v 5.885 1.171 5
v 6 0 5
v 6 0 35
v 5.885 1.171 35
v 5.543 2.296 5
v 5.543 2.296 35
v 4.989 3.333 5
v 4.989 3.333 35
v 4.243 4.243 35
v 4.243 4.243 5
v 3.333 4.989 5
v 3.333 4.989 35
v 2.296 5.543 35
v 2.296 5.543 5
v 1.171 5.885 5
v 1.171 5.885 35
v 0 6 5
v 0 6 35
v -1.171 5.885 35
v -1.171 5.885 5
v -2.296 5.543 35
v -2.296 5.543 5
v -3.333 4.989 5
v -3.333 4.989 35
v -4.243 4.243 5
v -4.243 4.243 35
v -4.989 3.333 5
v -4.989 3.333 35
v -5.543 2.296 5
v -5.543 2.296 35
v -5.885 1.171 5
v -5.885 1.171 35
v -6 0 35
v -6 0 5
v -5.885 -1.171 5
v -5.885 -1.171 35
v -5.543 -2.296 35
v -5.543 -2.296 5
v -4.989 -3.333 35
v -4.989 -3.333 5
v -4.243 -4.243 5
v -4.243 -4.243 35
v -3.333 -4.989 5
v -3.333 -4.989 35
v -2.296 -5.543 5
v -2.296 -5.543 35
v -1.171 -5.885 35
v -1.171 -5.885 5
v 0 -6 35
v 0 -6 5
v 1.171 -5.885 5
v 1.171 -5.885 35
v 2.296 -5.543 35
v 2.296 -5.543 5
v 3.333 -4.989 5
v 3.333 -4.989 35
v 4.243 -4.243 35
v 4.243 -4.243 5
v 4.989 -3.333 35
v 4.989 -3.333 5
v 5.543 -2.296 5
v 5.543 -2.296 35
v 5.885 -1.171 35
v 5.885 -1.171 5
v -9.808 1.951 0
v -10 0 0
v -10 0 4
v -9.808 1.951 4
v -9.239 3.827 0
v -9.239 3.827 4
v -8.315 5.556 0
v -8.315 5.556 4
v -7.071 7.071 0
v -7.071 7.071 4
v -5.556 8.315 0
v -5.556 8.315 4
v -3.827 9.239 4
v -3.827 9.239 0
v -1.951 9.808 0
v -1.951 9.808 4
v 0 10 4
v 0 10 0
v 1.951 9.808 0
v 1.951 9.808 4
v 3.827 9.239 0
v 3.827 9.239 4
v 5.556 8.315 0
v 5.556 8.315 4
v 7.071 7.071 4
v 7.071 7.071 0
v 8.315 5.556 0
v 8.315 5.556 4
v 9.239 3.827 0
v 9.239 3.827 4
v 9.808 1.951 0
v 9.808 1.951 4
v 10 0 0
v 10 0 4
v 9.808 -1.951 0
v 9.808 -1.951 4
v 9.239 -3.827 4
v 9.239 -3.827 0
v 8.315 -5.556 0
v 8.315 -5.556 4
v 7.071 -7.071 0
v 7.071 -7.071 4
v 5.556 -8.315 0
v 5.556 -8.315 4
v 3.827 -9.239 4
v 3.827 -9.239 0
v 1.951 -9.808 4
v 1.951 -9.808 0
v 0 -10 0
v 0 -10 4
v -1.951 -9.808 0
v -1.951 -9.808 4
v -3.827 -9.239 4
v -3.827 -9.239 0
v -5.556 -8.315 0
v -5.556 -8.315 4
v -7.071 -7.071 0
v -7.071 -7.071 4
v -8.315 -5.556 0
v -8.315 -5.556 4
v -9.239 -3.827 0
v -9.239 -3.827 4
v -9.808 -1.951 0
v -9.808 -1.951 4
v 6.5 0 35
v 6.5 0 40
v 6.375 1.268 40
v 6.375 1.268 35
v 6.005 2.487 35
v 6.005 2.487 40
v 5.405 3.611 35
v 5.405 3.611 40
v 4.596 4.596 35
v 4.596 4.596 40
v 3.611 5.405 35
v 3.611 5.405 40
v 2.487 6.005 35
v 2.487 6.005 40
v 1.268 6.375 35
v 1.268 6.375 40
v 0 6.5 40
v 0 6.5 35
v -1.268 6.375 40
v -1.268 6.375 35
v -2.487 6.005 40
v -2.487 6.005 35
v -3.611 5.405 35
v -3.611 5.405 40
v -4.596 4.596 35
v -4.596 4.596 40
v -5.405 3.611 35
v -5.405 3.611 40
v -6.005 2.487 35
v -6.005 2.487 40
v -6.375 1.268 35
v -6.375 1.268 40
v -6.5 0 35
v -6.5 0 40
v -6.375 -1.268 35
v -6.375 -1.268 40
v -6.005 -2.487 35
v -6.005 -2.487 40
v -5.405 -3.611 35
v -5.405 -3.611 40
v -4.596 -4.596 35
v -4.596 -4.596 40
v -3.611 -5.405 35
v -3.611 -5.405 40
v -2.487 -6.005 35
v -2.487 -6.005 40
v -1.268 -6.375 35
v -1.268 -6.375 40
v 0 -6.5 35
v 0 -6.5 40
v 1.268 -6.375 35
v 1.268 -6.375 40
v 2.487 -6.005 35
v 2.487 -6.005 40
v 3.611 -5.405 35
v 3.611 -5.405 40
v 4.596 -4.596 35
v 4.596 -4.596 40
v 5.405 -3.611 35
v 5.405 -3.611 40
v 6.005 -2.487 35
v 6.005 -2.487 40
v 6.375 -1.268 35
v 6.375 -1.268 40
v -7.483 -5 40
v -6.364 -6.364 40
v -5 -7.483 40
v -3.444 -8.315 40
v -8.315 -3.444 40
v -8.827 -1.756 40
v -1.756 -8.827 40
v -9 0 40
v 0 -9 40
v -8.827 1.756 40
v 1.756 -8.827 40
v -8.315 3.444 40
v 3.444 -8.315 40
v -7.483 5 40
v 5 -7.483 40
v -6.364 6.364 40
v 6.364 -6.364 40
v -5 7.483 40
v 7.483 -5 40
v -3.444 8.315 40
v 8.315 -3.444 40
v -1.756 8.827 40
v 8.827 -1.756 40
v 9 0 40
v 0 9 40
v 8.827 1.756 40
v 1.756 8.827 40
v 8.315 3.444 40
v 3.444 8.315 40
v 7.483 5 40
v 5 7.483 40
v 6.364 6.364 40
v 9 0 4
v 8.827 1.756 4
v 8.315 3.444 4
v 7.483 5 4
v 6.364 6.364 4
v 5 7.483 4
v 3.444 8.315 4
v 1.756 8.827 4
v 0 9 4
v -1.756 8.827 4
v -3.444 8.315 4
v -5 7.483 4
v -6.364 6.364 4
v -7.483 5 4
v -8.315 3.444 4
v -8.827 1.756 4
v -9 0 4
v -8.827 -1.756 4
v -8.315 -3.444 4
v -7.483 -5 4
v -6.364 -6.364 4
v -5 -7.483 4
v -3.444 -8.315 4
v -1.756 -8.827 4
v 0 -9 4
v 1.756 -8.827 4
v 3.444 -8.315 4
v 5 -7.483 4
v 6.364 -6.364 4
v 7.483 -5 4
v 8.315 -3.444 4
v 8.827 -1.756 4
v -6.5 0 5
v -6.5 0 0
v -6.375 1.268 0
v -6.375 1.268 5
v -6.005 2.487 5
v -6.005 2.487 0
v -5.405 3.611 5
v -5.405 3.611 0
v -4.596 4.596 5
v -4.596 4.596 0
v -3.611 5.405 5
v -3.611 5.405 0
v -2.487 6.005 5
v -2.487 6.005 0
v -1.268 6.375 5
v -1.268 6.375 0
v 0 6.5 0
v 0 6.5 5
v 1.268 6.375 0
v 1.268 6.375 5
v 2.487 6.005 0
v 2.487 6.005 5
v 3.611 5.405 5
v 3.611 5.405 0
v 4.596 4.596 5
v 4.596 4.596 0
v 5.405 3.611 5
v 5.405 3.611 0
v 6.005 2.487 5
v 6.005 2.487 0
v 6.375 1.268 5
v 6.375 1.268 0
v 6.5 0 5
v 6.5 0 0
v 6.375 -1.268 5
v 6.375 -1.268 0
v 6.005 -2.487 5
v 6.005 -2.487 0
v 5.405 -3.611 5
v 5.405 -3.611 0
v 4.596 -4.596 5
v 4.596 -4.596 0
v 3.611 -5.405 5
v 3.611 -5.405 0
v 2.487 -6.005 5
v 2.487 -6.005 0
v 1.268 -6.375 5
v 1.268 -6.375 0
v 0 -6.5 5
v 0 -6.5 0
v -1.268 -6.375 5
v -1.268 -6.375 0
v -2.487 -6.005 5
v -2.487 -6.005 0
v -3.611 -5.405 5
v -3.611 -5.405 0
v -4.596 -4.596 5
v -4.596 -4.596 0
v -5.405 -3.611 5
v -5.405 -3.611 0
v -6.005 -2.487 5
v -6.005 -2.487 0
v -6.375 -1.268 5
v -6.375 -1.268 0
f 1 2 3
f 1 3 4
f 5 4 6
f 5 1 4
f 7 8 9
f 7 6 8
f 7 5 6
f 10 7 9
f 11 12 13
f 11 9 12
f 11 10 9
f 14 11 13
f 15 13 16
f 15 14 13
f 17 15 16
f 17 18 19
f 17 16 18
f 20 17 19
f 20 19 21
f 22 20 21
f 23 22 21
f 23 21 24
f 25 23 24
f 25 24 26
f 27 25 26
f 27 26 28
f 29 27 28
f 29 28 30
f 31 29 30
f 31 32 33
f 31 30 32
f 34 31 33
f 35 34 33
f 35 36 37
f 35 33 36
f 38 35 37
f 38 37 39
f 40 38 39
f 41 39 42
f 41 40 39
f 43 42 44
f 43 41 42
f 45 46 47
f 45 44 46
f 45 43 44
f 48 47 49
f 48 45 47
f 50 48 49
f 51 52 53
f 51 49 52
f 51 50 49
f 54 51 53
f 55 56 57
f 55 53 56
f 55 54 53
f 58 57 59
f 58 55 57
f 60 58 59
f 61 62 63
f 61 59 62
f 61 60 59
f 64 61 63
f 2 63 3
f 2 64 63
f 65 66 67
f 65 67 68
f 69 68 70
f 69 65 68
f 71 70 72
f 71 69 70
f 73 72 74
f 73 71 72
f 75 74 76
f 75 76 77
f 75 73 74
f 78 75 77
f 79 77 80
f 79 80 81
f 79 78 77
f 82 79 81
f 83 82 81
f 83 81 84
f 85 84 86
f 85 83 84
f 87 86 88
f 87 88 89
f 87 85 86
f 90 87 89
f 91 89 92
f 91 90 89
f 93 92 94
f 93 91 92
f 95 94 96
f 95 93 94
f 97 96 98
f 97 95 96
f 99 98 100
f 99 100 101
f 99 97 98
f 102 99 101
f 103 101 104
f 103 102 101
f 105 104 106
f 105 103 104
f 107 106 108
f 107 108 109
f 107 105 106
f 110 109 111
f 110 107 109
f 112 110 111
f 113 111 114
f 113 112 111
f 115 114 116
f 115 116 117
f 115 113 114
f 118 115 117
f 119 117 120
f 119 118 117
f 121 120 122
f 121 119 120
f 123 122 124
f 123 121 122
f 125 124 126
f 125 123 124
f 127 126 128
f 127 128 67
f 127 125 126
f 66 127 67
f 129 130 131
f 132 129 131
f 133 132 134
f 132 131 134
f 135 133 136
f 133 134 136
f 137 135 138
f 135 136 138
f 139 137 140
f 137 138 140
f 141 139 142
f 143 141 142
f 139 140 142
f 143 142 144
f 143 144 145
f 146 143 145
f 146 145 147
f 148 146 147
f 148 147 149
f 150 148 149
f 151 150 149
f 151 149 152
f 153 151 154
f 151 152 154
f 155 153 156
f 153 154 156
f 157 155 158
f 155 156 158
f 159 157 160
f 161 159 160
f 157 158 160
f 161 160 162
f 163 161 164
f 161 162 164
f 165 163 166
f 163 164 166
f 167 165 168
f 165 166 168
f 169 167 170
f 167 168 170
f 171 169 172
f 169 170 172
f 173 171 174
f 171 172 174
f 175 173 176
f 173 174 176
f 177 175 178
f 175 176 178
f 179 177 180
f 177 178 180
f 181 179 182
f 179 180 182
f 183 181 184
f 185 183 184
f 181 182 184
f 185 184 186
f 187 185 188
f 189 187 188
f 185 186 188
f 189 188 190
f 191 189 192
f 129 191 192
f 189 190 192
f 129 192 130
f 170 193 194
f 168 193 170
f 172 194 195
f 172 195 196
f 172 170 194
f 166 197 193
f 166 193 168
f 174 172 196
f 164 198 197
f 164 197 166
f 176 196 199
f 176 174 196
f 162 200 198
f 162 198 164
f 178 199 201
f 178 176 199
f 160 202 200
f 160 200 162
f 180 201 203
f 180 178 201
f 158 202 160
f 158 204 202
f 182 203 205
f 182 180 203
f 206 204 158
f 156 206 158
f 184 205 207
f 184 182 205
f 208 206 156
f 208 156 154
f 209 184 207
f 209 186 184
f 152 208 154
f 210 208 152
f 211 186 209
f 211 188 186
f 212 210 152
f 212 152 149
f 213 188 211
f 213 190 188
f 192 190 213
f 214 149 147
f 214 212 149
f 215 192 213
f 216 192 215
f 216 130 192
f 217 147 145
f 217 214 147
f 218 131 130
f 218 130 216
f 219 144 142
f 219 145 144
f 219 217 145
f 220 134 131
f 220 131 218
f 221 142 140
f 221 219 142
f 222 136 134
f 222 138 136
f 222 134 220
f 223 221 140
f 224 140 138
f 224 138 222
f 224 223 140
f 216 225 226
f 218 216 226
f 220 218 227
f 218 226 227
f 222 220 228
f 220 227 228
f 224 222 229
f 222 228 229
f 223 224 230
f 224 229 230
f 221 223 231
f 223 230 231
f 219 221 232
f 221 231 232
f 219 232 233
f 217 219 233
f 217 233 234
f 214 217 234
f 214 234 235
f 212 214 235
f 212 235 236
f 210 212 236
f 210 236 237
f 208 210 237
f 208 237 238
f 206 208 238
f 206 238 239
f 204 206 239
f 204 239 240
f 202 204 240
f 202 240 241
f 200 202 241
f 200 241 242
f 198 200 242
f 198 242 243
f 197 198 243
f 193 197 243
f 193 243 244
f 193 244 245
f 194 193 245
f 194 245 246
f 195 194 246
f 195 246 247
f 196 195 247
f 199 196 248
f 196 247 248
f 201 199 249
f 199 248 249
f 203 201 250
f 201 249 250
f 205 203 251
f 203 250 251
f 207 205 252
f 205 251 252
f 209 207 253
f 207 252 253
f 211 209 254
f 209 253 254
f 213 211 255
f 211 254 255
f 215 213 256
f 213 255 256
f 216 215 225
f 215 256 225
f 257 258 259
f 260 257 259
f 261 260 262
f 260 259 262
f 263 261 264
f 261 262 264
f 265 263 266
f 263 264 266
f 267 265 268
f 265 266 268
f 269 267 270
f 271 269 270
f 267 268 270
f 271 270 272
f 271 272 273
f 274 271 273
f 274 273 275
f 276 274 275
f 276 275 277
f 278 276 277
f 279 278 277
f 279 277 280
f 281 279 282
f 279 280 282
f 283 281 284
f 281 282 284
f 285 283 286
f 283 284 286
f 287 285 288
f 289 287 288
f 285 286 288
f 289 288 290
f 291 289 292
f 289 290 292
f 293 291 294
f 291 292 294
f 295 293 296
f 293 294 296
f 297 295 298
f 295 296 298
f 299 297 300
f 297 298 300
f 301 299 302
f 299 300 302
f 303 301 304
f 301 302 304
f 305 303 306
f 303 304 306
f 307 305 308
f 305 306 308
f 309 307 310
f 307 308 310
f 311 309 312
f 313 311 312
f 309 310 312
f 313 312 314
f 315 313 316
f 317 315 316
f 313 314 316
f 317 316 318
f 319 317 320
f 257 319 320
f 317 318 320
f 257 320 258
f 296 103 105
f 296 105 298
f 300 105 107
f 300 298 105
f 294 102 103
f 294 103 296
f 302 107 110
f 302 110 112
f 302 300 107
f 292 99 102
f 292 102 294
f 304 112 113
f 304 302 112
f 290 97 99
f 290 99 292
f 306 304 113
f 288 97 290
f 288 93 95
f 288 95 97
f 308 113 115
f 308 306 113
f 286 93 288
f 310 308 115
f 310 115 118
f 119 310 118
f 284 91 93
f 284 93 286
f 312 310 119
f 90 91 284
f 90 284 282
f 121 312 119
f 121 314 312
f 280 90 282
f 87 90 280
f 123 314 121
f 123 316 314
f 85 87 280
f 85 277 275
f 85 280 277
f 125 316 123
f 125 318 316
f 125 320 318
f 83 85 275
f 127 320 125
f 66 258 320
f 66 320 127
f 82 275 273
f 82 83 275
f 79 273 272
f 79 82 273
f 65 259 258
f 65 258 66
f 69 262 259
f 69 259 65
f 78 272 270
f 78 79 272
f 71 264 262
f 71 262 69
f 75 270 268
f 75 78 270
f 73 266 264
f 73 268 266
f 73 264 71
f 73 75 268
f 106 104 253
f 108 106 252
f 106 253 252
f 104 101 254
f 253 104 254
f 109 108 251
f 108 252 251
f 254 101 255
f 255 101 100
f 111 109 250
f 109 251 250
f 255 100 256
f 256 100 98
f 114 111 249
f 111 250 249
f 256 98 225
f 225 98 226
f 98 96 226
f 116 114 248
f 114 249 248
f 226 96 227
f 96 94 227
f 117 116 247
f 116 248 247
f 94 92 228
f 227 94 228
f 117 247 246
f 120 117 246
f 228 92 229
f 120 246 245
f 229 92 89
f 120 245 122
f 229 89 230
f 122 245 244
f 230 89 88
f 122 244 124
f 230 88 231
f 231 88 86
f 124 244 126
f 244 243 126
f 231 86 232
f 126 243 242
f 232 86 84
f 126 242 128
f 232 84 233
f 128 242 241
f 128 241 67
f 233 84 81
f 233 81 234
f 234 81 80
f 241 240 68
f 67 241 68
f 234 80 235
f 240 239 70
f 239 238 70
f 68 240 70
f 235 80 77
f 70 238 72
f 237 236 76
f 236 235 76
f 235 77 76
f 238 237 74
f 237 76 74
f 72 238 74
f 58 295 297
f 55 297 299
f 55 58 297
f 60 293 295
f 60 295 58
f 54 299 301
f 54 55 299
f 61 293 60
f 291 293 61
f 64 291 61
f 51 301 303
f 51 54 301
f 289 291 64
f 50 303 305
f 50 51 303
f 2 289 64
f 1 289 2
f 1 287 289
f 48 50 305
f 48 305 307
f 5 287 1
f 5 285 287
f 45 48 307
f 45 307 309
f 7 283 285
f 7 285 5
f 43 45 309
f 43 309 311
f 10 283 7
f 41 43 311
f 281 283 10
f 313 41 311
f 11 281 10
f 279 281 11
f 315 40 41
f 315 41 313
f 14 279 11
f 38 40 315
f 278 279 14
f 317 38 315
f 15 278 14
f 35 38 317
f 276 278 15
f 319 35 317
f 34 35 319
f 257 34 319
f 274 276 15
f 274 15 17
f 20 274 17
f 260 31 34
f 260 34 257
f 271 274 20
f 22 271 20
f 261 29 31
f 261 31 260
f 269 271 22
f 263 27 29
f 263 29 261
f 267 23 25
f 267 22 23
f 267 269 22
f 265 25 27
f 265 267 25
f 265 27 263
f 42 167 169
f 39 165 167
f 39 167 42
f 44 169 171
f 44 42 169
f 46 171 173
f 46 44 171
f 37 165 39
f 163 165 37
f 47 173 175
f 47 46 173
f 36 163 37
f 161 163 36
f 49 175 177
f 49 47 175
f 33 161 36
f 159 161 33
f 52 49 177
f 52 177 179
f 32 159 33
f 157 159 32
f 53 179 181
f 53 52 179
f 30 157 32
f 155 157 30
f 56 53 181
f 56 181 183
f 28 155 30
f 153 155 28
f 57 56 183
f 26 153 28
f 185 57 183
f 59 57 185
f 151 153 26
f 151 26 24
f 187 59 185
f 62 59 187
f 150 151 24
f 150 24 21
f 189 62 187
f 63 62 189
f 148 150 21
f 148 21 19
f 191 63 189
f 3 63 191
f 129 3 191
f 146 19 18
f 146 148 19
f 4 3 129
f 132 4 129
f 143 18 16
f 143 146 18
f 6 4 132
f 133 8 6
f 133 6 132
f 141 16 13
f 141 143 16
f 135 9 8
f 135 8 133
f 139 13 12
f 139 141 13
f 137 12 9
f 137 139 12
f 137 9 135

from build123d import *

# Parameters (mm, degrees)
SKETCH_1_R          = 9
SKETCH_1_R_2        = 6
EXTRUDE_1_DEPTH     = 40
SKETCH_2_R          = 6.5
CUT_EXTRUDE_1_DEPTH = 5
SKETCH_3_R          = 6.5
CUT_EXTRUDE_2_DEPTH = 5
SKETCH_4_R          = 10
SKETCH_4_R_2        = 9
EXTRUDE_2_DEPTH     = 4


with BuildPart() as part:
    # 草图1 → 凸台-拉伸1 (new body)
    with BuildSketch(Plane.XY):
        Circle(SKETCH_1_R)
        Circle(SKETCH_1_R_2, mode=Mode.SUBTRACT)
    extrude(amount=EXTRUDE_1_DEPTH)

    # 草图2 → 切除-拉伸1 (cut)
    with BuildSketch(Plane.XY.offset(40)):
        Circle(SKETCH_2_R)
    extrude(amount=-CUT_EXTRUDE_1_DEPTH, mode=Mode.SUBTRACT)

    # 草图3 → 切除-拉伸2 (cut)
    with BuildSketch(Plane(origin=(0, 0, 0), x_dir=(-1, 0, 0), z_dir=(0, 0, -1))):
        Circle(SKETCH_3_R)
    extrude(amount=-CUT_EXTRUDE_2_DEPTH, mode=Mode.SUBTRACT)

    # 草图4 → 凸台-拉伸2 (add)
    with BuildSketch(Plane(origin=(0, 0, 0), x_dir=(-1, 0, 0), z_dir=(0, 0, -1))):
        Circle(SKETCH_4_R)
        Circle(SKETCH_4_R_2, mode=Mode.SUBTRACT)
    extrude(amount=-EXTRUDE_2_DEPTH)


solid = part.part
